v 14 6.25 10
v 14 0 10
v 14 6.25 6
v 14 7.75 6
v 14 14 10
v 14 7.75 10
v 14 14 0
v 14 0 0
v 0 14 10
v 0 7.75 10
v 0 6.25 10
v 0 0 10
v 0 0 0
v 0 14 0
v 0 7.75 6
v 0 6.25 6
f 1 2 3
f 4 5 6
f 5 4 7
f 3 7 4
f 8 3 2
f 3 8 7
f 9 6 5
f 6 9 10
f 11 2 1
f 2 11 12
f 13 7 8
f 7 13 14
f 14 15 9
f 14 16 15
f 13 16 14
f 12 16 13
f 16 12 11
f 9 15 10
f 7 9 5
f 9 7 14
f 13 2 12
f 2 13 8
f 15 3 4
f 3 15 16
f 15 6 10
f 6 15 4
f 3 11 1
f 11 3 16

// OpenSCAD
$fn = 32;

// ----------------------------------------------------------------------
// Micro clip: slotted block, 5-20 mm class
// ----------------------------------------------------------------------

// --- parameters (mm) ---
block_l = 14;             // block length, X
block_w = 14;             // block width, Y
block_h = 10;             // block height, Z
slot_w = 1.5;             // slot width
slot_d = 4;               // slot depth from the top

difference() {
  cube([block_l, block_w, block_h]);
  translate([-1, block_w / 2 - slot_w / 2, block_h - slot_d])
    cube([block_l + 2, slot_w, slot_d + 1]);
}
